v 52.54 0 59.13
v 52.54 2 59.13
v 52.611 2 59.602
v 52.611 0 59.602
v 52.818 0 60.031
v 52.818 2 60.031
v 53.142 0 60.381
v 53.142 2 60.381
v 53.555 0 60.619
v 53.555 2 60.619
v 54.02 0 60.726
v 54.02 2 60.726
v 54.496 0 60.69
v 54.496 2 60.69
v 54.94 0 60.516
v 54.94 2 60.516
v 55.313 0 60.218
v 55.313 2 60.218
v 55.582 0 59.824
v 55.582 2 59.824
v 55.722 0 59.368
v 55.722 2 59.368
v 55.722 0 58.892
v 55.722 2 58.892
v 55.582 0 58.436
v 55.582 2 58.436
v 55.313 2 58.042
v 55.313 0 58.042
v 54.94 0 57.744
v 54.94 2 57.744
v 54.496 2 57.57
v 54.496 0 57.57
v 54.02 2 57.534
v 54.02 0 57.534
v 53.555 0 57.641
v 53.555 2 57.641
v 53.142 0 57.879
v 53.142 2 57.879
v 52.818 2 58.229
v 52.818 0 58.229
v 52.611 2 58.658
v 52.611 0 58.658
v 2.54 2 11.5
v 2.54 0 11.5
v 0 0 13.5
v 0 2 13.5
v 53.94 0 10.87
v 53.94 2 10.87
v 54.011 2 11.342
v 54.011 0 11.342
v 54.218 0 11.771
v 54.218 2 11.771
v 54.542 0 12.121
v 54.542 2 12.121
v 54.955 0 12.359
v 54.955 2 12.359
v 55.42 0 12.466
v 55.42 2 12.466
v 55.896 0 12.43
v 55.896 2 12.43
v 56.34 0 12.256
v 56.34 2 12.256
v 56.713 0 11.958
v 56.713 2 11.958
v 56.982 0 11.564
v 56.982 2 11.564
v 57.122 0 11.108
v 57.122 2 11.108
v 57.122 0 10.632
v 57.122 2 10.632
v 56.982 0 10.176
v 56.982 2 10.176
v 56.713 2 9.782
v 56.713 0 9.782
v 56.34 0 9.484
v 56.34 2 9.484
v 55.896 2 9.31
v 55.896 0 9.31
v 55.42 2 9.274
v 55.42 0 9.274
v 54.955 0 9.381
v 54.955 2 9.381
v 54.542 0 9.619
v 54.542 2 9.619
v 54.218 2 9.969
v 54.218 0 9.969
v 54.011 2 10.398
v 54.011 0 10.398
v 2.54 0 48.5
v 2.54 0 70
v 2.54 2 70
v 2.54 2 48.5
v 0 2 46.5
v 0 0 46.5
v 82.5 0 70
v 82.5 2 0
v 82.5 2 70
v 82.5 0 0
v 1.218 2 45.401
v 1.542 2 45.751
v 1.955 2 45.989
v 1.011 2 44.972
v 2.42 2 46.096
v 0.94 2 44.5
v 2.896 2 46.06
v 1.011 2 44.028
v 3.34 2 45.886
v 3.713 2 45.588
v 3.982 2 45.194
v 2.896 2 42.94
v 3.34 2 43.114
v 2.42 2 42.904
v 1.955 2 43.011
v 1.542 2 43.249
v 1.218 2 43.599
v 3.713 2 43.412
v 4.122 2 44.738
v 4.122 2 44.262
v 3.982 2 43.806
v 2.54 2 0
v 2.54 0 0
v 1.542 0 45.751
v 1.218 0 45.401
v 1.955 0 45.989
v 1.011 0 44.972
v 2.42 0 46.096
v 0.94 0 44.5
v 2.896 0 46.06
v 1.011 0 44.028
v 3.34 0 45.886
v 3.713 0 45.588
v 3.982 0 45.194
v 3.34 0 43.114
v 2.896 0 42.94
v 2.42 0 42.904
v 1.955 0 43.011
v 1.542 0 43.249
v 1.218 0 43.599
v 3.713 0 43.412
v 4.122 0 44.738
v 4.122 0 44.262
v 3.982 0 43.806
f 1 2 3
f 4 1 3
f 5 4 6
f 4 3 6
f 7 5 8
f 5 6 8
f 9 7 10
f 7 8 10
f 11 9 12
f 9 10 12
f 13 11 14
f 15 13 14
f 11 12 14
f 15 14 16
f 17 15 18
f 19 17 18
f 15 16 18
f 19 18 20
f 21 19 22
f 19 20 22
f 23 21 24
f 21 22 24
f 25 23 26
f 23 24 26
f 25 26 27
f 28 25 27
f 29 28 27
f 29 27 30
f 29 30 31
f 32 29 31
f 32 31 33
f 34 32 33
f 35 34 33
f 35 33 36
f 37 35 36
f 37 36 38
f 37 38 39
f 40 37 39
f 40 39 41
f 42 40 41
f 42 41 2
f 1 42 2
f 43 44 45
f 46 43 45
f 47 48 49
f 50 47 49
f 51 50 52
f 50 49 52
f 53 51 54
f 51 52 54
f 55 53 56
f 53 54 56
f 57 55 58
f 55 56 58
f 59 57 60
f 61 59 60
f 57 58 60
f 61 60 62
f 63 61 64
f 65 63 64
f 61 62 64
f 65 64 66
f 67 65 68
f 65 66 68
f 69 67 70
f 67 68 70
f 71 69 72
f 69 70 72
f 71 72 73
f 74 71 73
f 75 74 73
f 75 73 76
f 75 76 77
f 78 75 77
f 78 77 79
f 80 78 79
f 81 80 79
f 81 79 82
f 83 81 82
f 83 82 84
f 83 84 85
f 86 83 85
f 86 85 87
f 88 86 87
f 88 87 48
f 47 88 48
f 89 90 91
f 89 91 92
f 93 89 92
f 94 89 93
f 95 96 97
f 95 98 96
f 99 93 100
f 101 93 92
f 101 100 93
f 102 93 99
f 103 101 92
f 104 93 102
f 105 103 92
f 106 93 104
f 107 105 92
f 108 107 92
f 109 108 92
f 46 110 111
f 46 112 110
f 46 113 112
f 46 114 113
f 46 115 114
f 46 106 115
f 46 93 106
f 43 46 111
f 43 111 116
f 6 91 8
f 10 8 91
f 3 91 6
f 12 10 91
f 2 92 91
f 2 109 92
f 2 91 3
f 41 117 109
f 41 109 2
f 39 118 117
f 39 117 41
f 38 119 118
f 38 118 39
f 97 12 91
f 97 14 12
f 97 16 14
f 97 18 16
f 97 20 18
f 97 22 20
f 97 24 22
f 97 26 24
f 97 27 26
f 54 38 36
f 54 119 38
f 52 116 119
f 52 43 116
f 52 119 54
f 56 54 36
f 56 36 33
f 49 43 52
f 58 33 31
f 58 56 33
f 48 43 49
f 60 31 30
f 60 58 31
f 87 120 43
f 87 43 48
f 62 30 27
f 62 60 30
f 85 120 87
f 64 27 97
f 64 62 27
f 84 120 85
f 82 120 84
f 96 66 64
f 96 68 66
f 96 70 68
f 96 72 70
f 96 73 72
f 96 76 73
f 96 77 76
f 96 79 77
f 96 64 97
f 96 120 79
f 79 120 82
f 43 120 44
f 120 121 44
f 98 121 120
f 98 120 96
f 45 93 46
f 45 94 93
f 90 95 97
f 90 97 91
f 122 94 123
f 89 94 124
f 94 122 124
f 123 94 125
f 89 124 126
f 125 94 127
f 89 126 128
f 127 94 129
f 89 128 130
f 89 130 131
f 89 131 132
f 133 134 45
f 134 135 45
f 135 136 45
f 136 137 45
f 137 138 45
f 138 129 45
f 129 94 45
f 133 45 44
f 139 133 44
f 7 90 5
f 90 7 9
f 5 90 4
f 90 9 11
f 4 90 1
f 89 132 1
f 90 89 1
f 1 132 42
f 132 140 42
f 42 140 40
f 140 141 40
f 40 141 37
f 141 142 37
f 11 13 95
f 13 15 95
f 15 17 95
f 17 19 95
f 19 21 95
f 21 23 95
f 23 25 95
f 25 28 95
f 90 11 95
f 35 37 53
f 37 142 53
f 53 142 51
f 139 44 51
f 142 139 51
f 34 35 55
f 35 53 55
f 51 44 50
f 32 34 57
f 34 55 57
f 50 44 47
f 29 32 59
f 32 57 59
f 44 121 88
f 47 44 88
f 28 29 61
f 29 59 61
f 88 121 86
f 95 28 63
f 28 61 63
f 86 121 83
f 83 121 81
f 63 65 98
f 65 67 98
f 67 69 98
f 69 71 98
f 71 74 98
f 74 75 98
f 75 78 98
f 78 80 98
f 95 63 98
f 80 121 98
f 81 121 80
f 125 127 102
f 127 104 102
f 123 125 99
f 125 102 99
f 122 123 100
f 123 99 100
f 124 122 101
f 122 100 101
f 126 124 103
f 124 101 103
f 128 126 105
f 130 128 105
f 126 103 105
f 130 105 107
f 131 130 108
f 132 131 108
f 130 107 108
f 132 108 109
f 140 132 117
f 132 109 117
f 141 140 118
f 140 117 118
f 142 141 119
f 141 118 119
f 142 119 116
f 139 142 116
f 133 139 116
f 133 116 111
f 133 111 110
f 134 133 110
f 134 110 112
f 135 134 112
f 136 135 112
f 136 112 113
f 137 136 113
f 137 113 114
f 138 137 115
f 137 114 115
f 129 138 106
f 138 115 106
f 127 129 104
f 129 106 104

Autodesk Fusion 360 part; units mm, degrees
sketch "Sketch1" plane through (0, 0, 0) normal (0, 1, 0) x (1, 0, 0)
  line L0 (0, 0) -> (82.5, 0)
  line L1 (82.5, 0) -> (82.5, -70)
  line L2 (82.5, -70) -> (0, -70)
  line L3 (0, -70) -> (0, 0)
  line L4 (2.54, -70) -> (2.54, -48.5)
  line L5 (2.54, -48.5) -> (0, -46.5)
  line L6 (2.54, 0) -> (2.54, -11.5)
  line L7 (2.54, -11.5) -> (0, -13.5)
  dimension "d1" = 82.5
  dimension "d2" = 70
  dimension "d3" = 33
  dimension "d4" = 11.5
  dimension "d5" = 2.54
  dimension "d6" = 2.54
  dimension "d7" = 21.5
  dimension "d8" = 2
extrude "Extrude1" add sketch "Sketch1" along normal blind 2 contours L0 L1 L2 L3 L4 L5 L6 L7
sketch "Sketch2" plane through (0, 2, 0) normal (0, 1, 0) x (-1, 0, 0)
  line L0 (-2.54, 0) -> (-2.54, 11.5)
  line L1 (-2.54, 11.5) -> (0, 13.5)
  line L2 (0, 13.5) -> (0, 46.5)
  line L3 (0, 46.5) -> (-2.54, 48.5)
  line L4 (-2.54, 48.5) -> (-2.54, 70)
  line L5 (-2.54, 70) -> (-82.5, 70)
  line L6 (-82.5, 70) -> (-82.5, 0)
  line L7 (-82.5, 0) -> (-2.54, 0)
  circle A0 centre (-2.54, 44.5) radius 1.6
  circle A1 centre (-54.14, 59.13) radius 1.6
  circle A2 centre (-55.54, 10.87) radius 1.6
  dimension "d11" = 3.2
  dimension "d12" = 2.54
  dimension "d13" = 33
  dimension "d14" = 3.2
  dimension "d15" = 3.2
  dimension "d17" = 10.87
  dimension "d20" = 53
  dimension "d21" = 51.6
  dimension "d22" = 48.26
extrude "Extrude2" cut sketch "Sketch2" against normal blind 2 contours A0 | A1 | A2
